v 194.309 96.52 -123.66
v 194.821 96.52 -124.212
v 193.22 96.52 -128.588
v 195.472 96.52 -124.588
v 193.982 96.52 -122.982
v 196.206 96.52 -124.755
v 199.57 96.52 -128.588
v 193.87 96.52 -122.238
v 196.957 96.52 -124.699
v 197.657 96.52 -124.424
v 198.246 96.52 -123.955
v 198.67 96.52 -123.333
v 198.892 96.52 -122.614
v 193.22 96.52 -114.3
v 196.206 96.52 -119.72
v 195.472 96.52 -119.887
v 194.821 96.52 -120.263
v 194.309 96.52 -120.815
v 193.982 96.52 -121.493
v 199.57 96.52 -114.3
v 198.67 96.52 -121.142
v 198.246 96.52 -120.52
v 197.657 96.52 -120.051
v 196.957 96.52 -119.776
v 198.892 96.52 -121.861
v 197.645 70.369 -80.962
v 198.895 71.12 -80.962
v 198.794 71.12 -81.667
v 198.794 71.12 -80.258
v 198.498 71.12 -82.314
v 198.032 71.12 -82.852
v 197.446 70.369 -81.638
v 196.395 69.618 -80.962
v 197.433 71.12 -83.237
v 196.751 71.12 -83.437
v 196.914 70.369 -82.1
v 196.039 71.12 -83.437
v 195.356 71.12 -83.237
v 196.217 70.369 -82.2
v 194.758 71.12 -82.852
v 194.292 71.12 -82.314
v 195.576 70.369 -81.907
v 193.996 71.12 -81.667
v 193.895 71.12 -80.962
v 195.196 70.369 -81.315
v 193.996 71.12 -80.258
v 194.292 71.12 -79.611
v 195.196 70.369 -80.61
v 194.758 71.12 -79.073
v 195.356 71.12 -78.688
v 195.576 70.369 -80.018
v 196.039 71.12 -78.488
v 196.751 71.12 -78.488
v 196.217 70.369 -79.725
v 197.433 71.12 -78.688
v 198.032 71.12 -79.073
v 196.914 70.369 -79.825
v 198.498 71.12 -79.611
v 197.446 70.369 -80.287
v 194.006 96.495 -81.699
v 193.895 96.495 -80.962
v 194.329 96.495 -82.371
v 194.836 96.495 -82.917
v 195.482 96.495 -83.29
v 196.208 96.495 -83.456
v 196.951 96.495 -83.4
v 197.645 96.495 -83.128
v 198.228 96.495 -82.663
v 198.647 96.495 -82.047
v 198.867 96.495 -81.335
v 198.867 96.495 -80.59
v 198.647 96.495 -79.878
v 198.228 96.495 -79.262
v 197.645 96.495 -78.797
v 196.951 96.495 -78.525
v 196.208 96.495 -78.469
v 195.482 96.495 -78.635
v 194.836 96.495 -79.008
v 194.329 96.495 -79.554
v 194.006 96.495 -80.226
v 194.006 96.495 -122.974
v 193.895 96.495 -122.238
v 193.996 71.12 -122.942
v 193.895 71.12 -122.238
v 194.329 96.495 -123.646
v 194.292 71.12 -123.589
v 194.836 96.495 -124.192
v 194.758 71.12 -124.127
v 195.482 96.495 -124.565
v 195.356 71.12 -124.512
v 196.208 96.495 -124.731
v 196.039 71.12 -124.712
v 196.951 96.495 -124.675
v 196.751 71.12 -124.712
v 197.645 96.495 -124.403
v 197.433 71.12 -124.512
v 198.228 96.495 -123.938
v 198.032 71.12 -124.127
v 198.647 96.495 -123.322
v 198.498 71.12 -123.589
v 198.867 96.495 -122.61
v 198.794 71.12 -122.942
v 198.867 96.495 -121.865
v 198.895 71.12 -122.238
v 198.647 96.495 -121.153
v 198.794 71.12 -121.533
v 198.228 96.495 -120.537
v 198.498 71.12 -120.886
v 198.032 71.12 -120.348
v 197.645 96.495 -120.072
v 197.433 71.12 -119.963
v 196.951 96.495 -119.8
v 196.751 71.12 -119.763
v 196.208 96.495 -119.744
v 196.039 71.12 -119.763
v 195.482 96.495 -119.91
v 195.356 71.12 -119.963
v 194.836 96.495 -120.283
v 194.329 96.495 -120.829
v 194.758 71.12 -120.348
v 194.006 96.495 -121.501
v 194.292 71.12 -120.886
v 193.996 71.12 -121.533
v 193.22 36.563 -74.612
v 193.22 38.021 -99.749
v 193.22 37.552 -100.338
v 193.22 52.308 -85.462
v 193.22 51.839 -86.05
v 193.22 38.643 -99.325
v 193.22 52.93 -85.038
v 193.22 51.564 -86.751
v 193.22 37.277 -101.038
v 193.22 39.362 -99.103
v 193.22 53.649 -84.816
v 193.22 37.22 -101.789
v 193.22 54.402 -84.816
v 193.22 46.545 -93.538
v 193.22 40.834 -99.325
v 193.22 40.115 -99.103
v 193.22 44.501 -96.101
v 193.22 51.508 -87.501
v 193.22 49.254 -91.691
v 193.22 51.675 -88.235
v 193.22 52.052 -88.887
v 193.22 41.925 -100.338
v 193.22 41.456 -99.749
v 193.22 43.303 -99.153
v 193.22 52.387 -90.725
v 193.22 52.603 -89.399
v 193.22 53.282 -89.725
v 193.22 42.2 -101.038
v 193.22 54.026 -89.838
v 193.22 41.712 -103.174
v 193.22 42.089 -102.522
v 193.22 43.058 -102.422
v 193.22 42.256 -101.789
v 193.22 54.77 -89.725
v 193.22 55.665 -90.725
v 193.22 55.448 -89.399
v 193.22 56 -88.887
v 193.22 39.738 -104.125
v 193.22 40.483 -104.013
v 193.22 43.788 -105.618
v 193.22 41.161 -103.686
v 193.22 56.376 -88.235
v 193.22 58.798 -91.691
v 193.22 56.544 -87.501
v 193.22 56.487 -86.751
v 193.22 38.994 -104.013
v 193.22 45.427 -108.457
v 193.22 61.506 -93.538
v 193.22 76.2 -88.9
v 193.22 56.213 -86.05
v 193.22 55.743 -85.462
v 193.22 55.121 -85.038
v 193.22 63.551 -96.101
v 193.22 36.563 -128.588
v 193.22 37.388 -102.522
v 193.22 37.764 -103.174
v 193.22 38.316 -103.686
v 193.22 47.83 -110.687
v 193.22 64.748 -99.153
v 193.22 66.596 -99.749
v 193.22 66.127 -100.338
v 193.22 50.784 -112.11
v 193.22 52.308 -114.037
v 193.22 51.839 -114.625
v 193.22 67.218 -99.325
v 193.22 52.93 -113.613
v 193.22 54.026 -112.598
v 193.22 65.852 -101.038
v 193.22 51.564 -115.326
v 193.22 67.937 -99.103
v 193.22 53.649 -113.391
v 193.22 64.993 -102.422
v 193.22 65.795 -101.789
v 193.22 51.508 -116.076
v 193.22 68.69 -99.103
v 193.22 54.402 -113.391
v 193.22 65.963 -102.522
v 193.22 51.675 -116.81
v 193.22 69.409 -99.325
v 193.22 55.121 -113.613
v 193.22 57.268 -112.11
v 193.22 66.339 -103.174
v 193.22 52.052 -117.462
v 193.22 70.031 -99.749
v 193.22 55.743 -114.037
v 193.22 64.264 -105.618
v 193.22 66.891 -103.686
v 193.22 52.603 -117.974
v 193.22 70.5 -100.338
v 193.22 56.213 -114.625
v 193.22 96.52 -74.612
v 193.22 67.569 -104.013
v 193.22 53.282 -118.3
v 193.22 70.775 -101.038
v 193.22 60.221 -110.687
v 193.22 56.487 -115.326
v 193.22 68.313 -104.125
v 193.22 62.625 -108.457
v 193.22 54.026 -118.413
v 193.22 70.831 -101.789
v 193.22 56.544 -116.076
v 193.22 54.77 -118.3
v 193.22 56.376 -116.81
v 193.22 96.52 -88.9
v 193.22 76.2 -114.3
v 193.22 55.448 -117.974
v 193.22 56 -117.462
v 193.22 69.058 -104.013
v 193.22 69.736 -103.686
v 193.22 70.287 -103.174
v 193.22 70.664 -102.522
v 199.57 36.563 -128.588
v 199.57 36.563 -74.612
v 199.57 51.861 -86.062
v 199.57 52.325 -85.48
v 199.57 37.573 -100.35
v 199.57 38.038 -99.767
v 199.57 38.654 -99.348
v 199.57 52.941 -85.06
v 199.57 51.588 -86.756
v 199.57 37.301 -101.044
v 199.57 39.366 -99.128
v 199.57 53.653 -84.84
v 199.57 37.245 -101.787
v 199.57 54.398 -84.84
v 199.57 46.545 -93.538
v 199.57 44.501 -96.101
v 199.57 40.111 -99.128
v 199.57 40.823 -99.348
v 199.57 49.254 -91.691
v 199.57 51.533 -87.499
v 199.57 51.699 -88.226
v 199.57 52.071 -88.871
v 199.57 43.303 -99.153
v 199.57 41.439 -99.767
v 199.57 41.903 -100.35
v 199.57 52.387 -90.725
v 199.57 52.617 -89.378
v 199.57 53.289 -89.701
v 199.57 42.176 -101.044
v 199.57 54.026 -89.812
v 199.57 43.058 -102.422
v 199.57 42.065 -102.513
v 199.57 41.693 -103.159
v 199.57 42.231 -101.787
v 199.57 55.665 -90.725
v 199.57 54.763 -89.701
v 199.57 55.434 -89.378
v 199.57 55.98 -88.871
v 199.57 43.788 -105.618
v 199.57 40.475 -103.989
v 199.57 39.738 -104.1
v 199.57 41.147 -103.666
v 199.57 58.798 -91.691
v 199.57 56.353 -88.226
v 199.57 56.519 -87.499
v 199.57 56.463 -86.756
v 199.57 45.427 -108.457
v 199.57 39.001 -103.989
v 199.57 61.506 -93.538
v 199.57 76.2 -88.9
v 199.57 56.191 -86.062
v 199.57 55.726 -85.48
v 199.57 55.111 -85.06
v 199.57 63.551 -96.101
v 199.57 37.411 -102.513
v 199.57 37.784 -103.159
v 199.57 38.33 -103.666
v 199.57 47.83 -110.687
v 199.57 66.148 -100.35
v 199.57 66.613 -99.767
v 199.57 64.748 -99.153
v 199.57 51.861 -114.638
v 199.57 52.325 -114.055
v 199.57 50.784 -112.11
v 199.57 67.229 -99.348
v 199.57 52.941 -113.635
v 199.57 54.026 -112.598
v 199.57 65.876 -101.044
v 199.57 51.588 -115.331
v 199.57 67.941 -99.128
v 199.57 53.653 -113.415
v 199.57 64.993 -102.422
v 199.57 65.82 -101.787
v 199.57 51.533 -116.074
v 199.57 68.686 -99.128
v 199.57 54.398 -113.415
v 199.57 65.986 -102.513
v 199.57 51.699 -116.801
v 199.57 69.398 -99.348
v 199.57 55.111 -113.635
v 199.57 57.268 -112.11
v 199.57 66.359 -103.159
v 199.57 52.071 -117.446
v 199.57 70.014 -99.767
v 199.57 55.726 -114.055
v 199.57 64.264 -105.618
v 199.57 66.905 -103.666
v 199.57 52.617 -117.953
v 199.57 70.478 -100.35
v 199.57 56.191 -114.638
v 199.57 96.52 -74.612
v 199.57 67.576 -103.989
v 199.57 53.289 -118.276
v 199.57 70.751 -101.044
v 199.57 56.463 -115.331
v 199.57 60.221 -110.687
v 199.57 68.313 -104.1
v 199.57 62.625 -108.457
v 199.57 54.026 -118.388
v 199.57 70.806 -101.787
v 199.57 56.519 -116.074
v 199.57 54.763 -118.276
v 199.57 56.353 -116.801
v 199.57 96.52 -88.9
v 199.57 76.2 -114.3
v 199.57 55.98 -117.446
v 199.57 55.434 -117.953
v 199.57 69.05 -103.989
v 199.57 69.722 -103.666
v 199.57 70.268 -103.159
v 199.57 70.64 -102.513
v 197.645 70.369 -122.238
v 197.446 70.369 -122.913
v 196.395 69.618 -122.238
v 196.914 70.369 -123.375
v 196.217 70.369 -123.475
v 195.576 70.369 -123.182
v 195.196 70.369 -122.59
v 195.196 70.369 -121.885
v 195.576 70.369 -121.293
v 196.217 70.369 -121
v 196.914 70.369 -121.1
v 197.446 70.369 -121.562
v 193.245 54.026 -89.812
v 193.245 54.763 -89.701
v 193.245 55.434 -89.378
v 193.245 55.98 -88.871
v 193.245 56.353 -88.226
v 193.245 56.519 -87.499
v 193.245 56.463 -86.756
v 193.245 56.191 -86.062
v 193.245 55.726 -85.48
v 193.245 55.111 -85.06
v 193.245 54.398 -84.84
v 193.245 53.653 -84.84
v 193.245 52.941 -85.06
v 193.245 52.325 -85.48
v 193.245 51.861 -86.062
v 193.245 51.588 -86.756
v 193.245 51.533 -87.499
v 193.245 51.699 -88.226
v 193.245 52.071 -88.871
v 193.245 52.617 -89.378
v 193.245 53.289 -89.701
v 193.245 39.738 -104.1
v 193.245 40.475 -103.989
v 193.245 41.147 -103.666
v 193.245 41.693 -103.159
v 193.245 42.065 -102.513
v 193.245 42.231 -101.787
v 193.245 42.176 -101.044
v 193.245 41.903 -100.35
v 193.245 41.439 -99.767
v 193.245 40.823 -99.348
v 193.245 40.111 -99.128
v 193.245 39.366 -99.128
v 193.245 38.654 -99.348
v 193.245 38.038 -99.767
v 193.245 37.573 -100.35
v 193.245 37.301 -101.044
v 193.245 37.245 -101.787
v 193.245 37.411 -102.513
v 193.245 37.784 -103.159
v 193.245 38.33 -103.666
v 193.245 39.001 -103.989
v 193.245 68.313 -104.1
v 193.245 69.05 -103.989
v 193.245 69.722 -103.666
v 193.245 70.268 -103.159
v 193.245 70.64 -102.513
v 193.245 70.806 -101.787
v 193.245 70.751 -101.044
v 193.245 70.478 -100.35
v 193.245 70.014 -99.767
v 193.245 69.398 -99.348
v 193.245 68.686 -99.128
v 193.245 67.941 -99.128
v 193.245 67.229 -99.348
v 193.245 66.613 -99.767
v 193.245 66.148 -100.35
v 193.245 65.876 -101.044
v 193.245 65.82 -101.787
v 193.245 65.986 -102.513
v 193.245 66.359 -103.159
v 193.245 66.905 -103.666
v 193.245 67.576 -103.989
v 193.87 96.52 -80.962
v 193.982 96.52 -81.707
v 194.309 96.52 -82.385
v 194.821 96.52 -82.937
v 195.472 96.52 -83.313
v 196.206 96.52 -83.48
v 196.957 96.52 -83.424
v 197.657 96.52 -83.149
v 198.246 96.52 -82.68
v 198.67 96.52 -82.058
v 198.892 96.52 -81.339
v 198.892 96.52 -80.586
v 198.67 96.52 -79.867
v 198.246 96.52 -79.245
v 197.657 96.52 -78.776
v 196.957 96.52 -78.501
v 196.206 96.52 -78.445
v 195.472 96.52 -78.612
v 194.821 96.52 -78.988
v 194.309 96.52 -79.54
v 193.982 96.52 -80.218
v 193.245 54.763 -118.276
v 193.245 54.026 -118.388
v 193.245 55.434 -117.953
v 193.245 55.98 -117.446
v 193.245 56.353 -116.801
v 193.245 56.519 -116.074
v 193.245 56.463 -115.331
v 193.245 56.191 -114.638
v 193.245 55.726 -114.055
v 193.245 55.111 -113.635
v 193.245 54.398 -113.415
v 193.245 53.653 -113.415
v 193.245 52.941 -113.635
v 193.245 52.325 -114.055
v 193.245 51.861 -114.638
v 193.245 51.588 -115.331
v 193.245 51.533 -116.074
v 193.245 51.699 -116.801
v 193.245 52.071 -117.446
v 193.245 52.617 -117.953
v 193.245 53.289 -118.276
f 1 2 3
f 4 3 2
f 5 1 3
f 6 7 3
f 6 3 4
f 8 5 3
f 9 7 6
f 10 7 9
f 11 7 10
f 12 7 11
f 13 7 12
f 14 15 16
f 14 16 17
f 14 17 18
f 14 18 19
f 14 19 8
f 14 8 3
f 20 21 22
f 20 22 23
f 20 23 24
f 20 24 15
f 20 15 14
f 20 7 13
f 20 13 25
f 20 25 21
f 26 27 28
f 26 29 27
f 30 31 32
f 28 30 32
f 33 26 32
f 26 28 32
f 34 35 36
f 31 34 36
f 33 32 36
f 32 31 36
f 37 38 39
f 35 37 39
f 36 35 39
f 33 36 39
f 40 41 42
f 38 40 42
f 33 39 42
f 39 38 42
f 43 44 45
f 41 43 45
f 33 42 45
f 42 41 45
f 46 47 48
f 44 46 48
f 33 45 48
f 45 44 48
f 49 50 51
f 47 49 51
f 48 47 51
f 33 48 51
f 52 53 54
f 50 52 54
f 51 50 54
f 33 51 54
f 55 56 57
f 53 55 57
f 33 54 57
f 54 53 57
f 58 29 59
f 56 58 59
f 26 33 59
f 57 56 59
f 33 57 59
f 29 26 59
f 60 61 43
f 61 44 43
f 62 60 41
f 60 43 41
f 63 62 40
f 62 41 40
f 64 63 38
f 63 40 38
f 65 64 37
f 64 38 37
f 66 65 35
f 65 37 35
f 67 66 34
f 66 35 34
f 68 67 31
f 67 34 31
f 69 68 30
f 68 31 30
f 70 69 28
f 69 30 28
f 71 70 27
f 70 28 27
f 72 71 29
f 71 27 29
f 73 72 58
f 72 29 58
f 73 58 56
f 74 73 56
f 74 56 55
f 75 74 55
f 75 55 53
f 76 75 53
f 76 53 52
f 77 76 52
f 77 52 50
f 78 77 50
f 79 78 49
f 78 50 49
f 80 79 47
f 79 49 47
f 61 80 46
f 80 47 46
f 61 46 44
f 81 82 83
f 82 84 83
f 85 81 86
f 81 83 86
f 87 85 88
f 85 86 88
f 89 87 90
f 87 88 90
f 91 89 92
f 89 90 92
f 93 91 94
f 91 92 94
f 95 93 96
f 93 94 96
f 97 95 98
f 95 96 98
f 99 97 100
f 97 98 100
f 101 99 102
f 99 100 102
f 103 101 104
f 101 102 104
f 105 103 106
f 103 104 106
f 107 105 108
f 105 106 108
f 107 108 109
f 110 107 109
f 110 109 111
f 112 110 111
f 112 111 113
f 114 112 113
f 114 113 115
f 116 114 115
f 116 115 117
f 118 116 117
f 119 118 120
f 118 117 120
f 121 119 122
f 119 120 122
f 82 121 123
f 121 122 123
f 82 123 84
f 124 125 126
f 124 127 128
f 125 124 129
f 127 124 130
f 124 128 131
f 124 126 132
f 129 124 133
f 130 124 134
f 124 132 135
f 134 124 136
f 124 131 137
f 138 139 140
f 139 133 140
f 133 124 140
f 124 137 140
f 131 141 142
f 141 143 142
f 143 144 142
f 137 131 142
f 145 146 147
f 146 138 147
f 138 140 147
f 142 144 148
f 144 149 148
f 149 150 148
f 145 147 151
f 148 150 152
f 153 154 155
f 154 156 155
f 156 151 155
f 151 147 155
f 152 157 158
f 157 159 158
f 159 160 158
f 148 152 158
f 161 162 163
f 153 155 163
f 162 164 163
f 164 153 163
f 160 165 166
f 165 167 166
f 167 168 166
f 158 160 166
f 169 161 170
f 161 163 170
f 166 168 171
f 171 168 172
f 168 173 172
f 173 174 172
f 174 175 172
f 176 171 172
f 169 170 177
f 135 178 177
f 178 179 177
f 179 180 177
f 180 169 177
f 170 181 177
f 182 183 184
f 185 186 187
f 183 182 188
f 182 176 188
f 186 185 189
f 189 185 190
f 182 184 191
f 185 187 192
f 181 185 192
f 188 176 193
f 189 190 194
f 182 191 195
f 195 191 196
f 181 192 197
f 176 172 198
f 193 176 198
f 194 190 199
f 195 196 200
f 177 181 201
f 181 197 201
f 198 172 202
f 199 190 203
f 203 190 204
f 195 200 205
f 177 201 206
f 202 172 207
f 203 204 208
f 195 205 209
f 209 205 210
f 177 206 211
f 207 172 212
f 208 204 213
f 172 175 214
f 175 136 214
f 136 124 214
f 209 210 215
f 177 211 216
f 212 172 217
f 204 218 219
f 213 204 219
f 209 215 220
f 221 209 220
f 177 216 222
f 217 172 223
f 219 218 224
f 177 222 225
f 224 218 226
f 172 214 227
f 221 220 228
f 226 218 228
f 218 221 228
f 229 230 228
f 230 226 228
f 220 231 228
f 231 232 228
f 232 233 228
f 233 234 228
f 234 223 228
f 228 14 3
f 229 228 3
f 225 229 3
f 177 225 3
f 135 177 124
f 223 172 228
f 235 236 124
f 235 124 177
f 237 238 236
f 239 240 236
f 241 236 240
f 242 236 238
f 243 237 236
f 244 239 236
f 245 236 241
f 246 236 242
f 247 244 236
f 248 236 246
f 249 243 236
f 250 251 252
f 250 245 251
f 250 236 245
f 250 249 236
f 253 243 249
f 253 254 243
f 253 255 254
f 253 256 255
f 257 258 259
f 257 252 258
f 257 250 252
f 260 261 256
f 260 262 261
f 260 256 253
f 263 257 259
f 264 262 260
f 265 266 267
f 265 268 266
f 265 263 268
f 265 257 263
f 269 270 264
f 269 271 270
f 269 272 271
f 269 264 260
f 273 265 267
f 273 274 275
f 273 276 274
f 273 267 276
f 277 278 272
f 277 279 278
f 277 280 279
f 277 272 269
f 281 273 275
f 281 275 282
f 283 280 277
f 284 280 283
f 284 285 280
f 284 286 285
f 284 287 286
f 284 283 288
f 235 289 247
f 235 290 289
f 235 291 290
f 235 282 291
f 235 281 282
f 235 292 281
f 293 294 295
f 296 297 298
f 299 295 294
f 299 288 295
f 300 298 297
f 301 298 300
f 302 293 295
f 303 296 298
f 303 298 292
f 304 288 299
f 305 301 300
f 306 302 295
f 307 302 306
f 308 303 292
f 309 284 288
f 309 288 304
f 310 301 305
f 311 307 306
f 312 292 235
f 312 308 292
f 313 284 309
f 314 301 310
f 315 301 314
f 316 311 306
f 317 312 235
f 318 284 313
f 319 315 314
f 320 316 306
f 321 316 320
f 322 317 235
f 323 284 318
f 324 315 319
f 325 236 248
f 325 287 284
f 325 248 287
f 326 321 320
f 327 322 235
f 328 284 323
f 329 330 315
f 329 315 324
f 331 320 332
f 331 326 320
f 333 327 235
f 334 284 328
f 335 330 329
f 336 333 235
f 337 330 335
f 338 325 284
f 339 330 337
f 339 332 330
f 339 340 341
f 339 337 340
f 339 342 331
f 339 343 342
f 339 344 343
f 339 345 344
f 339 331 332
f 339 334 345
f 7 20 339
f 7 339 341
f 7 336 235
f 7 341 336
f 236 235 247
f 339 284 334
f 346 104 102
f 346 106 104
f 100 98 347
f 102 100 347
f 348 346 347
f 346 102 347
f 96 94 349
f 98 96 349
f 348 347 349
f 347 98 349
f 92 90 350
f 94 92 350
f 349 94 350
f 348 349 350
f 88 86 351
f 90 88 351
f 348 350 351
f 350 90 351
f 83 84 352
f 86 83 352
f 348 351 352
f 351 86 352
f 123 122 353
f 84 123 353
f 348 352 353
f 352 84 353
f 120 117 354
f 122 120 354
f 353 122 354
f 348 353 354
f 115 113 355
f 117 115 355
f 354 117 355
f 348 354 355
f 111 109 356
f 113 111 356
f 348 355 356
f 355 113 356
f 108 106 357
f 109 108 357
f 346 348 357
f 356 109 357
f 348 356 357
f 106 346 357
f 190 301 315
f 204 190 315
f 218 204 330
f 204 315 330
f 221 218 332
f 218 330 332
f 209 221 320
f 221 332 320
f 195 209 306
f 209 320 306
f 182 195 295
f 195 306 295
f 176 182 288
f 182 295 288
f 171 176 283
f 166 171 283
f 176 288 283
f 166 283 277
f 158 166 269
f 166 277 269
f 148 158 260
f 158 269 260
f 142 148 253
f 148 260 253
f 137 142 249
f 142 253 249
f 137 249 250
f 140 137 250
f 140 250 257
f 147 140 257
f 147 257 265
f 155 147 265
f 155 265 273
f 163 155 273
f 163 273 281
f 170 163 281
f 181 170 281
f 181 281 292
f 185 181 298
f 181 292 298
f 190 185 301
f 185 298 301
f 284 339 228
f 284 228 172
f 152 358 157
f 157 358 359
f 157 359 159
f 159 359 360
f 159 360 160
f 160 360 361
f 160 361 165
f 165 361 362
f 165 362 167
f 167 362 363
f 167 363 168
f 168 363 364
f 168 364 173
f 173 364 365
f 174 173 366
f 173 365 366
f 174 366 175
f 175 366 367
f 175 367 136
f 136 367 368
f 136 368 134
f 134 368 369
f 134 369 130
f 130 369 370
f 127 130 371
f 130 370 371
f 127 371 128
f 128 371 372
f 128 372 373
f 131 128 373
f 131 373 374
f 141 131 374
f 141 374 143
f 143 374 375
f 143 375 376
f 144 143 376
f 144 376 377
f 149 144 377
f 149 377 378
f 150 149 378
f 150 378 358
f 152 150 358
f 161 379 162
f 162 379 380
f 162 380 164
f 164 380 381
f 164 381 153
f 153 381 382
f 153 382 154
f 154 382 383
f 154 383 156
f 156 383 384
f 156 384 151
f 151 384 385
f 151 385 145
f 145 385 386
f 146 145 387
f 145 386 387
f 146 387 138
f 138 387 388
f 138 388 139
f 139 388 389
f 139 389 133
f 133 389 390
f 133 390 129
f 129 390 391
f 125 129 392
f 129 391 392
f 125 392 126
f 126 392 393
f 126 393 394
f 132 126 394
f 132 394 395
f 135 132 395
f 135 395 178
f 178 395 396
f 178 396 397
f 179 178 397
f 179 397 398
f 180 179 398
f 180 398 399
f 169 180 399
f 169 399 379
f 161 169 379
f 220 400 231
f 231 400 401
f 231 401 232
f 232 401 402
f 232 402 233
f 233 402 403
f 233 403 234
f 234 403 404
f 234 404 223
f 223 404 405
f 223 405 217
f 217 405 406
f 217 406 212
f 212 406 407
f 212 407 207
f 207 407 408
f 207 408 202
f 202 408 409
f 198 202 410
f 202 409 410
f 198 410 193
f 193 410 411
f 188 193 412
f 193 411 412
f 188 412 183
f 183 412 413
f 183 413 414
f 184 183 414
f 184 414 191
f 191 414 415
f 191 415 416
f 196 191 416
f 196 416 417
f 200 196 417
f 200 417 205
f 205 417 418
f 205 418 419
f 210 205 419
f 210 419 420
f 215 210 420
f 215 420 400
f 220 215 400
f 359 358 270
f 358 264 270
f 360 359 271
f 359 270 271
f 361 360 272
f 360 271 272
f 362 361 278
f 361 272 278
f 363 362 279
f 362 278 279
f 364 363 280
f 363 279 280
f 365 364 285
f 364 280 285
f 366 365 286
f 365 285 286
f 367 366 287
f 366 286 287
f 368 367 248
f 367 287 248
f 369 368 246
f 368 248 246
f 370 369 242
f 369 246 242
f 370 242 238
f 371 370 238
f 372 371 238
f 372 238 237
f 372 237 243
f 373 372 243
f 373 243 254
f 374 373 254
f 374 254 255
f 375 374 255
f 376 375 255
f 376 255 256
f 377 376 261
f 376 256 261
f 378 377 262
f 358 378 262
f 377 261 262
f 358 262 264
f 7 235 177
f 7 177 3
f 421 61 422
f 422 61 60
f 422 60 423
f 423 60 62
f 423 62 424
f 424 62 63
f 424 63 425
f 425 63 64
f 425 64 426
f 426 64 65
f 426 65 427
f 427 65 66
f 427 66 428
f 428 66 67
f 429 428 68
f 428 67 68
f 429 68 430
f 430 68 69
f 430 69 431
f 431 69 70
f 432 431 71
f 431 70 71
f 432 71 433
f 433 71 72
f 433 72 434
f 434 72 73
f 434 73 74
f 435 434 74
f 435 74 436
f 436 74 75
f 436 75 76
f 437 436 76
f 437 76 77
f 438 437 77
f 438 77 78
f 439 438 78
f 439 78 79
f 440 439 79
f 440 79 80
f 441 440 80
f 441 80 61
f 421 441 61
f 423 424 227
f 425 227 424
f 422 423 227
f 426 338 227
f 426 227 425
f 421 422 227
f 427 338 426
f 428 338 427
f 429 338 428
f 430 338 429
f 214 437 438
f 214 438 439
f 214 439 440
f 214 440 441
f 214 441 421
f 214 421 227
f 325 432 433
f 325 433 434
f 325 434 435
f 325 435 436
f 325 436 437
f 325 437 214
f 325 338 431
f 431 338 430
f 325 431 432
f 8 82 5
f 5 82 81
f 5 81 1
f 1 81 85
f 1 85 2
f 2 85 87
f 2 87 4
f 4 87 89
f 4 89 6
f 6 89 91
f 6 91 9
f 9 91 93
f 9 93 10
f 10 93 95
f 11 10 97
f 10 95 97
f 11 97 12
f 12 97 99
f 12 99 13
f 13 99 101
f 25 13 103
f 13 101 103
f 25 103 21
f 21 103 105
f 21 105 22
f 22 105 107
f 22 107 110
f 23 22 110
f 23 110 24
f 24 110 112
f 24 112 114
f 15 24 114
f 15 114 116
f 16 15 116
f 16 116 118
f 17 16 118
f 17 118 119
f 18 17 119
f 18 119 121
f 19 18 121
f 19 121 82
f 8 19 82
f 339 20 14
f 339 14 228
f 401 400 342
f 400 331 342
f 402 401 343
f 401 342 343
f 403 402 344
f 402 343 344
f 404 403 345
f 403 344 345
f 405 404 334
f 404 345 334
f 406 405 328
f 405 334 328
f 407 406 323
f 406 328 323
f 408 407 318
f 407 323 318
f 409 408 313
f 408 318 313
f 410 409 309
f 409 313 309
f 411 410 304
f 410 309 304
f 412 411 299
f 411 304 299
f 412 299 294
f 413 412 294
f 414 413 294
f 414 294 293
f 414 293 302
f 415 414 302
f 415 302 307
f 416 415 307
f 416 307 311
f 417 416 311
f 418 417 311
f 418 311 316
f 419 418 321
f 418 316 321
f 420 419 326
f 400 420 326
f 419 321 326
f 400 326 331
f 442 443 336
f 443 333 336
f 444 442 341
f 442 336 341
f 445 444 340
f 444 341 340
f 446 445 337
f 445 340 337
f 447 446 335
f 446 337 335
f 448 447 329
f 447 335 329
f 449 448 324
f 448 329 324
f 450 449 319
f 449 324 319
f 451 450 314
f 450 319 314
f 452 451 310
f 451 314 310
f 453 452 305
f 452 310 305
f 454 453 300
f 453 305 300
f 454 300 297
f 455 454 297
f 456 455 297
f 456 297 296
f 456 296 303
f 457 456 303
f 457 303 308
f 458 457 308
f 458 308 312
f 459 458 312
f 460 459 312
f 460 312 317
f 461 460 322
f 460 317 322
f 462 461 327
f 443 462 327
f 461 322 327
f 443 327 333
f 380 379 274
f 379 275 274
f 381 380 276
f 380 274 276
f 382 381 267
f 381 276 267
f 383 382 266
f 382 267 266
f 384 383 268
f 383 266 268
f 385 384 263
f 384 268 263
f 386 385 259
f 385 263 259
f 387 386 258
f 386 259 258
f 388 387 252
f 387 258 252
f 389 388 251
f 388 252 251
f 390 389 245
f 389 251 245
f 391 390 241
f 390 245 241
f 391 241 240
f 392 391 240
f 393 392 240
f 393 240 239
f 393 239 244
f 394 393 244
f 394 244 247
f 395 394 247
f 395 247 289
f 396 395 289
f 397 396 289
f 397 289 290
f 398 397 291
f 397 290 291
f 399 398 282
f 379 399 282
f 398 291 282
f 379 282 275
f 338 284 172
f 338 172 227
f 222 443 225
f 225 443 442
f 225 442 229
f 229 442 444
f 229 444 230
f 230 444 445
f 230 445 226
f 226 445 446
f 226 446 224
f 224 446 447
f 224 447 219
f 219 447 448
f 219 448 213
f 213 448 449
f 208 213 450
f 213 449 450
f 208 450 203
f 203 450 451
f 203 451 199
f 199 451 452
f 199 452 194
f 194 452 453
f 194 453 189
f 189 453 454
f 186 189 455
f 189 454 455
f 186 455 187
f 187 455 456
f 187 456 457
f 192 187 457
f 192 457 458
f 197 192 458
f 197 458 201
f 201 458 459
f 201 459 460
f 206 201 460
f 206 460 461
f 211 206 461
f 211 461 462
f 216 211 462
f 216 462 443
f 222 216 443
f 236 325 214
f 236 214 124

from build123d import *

# Parameters (mm, degrees)
BOSS_EXTRUDE1_START             = 199.569918
SKETCH6_R                       = 10.9982
BOSS_EXTRUDE1_DEPTH             = 6.35
F_5_0MM_DOWEL_HOLE2_D           = 5
F_5_0MM_DOWEL_HOLE2_DEPTH       = 25.4
F_5_0MM_DOWEL_HOLE2_CSINK_D     = 5.05
F_5_0MM_DOWEL_HOLE2_CSINK_ANGLE = 90
F_5_0MM_DOWEL_HOLE2_TIP         = 1.502151548
F_5_0MM_DOWEL_HOLE3_D           = 5
F_5_0MM_DOWEL_HOLE3_DEPTH       = 25.4
F_5_0MM_DOWEL_HOLE3_CSINK_D     = 5.05
F_5_0MM_DOWEL_HOLE3_CSINK_ANGLE = 90
F_5_0MM_DOWEL_HOLE3_TIP         = 1.502151548


with BuildPart() as part:
    # Sketch6 → Boss-Extrude1 (new body)
    with BuildSketch(Plane(origin=(0, 0, 0), x_dir=(0, 0, -1), z_dir=(1, 0, 0)).offset(BOSS_EXTRUDE1_START)):
        Polygon((74.6125, 36.5633), (128.5875, 36.5633), (128.5875, 96.52), (114.3, 96.52), (114.3, 76.2), (88.9, 76.2), (88.9, 96.52), (74.6125, 96.52), align=None)
        with Locations((101.6, 54.0258)):
            Circle(SKETCH6_R, mode=Mode.SUBTRACT)
    extrude(amount=-BOSS_EXTRUDE1_DEPTH)

    # Ø5.0mm Dowel Hole2
    with Locations(Plane.ZY.offset(-193.219917581)):
        with Locations((-101.6, 68.3133), (-87.3125, 54.0258), (-101.6, 39.7383), (-115.8875, 54.0258)):
            CounterSinkHole(F_5_0MM_DOWEL_HOLE2_D / 2, F_5_0MM_DOWEL_HOLE2_CSINK_D / 2, depth=F_5_0MM_DOWEL_HOLE2_DEPTH, counter_sink_angle=F_5_0MM_DOWEL_HOLE2_CSINK_ANGLE)
            with Locations((0, 0, -(F_5_0MM_DOWEL_HOLE2_DEPTH + F_5_0MM_DOWEL_HOLE2_TIP / 2))):  # 118° drill point
                Cone(0, F_5_0MM_DOWEL_HOLE2_D / 2, F_5_0MM_DOWEL_HOLE2_TIP, mode=Mode.SUBTRACT)

    # Ø5.0mm Dowel Hole3
    with Locations(Plane(origin=(0, 96.52, 0), x_dir=(1, 0, 0), z_dir=(0, 1, 0))):
        with Locations((196.394917581, 80.9625), (196.394917581, 122.2375)):
            CounterSinkHole(F_5_0MM_DOWEL_HOLE3_D / 2, F_5_0MM_DOWEL_HOLE3_CSINK_D / 2, depth=F_5_0MM_DOWEL_HOLE3_DEPTH, counter_sink_angle=F_5_0MM_DOWEL_HOLE3_CSINK_ANGLE)
            with Locations((0, 0, -(F_5_0MM_DOWEL_HOLE3_DEPTH + F_5_0MM_DOWEL_HOLE3_TIP / 2))):  # 118° drill point
                Cone(0, F_5_0MM_DOWEL_HOLE3_D / 2, F_5_0MM_DOWEL_HOLE3_TIP, mode=Mode.SUBTRACT)


solid = part.part
